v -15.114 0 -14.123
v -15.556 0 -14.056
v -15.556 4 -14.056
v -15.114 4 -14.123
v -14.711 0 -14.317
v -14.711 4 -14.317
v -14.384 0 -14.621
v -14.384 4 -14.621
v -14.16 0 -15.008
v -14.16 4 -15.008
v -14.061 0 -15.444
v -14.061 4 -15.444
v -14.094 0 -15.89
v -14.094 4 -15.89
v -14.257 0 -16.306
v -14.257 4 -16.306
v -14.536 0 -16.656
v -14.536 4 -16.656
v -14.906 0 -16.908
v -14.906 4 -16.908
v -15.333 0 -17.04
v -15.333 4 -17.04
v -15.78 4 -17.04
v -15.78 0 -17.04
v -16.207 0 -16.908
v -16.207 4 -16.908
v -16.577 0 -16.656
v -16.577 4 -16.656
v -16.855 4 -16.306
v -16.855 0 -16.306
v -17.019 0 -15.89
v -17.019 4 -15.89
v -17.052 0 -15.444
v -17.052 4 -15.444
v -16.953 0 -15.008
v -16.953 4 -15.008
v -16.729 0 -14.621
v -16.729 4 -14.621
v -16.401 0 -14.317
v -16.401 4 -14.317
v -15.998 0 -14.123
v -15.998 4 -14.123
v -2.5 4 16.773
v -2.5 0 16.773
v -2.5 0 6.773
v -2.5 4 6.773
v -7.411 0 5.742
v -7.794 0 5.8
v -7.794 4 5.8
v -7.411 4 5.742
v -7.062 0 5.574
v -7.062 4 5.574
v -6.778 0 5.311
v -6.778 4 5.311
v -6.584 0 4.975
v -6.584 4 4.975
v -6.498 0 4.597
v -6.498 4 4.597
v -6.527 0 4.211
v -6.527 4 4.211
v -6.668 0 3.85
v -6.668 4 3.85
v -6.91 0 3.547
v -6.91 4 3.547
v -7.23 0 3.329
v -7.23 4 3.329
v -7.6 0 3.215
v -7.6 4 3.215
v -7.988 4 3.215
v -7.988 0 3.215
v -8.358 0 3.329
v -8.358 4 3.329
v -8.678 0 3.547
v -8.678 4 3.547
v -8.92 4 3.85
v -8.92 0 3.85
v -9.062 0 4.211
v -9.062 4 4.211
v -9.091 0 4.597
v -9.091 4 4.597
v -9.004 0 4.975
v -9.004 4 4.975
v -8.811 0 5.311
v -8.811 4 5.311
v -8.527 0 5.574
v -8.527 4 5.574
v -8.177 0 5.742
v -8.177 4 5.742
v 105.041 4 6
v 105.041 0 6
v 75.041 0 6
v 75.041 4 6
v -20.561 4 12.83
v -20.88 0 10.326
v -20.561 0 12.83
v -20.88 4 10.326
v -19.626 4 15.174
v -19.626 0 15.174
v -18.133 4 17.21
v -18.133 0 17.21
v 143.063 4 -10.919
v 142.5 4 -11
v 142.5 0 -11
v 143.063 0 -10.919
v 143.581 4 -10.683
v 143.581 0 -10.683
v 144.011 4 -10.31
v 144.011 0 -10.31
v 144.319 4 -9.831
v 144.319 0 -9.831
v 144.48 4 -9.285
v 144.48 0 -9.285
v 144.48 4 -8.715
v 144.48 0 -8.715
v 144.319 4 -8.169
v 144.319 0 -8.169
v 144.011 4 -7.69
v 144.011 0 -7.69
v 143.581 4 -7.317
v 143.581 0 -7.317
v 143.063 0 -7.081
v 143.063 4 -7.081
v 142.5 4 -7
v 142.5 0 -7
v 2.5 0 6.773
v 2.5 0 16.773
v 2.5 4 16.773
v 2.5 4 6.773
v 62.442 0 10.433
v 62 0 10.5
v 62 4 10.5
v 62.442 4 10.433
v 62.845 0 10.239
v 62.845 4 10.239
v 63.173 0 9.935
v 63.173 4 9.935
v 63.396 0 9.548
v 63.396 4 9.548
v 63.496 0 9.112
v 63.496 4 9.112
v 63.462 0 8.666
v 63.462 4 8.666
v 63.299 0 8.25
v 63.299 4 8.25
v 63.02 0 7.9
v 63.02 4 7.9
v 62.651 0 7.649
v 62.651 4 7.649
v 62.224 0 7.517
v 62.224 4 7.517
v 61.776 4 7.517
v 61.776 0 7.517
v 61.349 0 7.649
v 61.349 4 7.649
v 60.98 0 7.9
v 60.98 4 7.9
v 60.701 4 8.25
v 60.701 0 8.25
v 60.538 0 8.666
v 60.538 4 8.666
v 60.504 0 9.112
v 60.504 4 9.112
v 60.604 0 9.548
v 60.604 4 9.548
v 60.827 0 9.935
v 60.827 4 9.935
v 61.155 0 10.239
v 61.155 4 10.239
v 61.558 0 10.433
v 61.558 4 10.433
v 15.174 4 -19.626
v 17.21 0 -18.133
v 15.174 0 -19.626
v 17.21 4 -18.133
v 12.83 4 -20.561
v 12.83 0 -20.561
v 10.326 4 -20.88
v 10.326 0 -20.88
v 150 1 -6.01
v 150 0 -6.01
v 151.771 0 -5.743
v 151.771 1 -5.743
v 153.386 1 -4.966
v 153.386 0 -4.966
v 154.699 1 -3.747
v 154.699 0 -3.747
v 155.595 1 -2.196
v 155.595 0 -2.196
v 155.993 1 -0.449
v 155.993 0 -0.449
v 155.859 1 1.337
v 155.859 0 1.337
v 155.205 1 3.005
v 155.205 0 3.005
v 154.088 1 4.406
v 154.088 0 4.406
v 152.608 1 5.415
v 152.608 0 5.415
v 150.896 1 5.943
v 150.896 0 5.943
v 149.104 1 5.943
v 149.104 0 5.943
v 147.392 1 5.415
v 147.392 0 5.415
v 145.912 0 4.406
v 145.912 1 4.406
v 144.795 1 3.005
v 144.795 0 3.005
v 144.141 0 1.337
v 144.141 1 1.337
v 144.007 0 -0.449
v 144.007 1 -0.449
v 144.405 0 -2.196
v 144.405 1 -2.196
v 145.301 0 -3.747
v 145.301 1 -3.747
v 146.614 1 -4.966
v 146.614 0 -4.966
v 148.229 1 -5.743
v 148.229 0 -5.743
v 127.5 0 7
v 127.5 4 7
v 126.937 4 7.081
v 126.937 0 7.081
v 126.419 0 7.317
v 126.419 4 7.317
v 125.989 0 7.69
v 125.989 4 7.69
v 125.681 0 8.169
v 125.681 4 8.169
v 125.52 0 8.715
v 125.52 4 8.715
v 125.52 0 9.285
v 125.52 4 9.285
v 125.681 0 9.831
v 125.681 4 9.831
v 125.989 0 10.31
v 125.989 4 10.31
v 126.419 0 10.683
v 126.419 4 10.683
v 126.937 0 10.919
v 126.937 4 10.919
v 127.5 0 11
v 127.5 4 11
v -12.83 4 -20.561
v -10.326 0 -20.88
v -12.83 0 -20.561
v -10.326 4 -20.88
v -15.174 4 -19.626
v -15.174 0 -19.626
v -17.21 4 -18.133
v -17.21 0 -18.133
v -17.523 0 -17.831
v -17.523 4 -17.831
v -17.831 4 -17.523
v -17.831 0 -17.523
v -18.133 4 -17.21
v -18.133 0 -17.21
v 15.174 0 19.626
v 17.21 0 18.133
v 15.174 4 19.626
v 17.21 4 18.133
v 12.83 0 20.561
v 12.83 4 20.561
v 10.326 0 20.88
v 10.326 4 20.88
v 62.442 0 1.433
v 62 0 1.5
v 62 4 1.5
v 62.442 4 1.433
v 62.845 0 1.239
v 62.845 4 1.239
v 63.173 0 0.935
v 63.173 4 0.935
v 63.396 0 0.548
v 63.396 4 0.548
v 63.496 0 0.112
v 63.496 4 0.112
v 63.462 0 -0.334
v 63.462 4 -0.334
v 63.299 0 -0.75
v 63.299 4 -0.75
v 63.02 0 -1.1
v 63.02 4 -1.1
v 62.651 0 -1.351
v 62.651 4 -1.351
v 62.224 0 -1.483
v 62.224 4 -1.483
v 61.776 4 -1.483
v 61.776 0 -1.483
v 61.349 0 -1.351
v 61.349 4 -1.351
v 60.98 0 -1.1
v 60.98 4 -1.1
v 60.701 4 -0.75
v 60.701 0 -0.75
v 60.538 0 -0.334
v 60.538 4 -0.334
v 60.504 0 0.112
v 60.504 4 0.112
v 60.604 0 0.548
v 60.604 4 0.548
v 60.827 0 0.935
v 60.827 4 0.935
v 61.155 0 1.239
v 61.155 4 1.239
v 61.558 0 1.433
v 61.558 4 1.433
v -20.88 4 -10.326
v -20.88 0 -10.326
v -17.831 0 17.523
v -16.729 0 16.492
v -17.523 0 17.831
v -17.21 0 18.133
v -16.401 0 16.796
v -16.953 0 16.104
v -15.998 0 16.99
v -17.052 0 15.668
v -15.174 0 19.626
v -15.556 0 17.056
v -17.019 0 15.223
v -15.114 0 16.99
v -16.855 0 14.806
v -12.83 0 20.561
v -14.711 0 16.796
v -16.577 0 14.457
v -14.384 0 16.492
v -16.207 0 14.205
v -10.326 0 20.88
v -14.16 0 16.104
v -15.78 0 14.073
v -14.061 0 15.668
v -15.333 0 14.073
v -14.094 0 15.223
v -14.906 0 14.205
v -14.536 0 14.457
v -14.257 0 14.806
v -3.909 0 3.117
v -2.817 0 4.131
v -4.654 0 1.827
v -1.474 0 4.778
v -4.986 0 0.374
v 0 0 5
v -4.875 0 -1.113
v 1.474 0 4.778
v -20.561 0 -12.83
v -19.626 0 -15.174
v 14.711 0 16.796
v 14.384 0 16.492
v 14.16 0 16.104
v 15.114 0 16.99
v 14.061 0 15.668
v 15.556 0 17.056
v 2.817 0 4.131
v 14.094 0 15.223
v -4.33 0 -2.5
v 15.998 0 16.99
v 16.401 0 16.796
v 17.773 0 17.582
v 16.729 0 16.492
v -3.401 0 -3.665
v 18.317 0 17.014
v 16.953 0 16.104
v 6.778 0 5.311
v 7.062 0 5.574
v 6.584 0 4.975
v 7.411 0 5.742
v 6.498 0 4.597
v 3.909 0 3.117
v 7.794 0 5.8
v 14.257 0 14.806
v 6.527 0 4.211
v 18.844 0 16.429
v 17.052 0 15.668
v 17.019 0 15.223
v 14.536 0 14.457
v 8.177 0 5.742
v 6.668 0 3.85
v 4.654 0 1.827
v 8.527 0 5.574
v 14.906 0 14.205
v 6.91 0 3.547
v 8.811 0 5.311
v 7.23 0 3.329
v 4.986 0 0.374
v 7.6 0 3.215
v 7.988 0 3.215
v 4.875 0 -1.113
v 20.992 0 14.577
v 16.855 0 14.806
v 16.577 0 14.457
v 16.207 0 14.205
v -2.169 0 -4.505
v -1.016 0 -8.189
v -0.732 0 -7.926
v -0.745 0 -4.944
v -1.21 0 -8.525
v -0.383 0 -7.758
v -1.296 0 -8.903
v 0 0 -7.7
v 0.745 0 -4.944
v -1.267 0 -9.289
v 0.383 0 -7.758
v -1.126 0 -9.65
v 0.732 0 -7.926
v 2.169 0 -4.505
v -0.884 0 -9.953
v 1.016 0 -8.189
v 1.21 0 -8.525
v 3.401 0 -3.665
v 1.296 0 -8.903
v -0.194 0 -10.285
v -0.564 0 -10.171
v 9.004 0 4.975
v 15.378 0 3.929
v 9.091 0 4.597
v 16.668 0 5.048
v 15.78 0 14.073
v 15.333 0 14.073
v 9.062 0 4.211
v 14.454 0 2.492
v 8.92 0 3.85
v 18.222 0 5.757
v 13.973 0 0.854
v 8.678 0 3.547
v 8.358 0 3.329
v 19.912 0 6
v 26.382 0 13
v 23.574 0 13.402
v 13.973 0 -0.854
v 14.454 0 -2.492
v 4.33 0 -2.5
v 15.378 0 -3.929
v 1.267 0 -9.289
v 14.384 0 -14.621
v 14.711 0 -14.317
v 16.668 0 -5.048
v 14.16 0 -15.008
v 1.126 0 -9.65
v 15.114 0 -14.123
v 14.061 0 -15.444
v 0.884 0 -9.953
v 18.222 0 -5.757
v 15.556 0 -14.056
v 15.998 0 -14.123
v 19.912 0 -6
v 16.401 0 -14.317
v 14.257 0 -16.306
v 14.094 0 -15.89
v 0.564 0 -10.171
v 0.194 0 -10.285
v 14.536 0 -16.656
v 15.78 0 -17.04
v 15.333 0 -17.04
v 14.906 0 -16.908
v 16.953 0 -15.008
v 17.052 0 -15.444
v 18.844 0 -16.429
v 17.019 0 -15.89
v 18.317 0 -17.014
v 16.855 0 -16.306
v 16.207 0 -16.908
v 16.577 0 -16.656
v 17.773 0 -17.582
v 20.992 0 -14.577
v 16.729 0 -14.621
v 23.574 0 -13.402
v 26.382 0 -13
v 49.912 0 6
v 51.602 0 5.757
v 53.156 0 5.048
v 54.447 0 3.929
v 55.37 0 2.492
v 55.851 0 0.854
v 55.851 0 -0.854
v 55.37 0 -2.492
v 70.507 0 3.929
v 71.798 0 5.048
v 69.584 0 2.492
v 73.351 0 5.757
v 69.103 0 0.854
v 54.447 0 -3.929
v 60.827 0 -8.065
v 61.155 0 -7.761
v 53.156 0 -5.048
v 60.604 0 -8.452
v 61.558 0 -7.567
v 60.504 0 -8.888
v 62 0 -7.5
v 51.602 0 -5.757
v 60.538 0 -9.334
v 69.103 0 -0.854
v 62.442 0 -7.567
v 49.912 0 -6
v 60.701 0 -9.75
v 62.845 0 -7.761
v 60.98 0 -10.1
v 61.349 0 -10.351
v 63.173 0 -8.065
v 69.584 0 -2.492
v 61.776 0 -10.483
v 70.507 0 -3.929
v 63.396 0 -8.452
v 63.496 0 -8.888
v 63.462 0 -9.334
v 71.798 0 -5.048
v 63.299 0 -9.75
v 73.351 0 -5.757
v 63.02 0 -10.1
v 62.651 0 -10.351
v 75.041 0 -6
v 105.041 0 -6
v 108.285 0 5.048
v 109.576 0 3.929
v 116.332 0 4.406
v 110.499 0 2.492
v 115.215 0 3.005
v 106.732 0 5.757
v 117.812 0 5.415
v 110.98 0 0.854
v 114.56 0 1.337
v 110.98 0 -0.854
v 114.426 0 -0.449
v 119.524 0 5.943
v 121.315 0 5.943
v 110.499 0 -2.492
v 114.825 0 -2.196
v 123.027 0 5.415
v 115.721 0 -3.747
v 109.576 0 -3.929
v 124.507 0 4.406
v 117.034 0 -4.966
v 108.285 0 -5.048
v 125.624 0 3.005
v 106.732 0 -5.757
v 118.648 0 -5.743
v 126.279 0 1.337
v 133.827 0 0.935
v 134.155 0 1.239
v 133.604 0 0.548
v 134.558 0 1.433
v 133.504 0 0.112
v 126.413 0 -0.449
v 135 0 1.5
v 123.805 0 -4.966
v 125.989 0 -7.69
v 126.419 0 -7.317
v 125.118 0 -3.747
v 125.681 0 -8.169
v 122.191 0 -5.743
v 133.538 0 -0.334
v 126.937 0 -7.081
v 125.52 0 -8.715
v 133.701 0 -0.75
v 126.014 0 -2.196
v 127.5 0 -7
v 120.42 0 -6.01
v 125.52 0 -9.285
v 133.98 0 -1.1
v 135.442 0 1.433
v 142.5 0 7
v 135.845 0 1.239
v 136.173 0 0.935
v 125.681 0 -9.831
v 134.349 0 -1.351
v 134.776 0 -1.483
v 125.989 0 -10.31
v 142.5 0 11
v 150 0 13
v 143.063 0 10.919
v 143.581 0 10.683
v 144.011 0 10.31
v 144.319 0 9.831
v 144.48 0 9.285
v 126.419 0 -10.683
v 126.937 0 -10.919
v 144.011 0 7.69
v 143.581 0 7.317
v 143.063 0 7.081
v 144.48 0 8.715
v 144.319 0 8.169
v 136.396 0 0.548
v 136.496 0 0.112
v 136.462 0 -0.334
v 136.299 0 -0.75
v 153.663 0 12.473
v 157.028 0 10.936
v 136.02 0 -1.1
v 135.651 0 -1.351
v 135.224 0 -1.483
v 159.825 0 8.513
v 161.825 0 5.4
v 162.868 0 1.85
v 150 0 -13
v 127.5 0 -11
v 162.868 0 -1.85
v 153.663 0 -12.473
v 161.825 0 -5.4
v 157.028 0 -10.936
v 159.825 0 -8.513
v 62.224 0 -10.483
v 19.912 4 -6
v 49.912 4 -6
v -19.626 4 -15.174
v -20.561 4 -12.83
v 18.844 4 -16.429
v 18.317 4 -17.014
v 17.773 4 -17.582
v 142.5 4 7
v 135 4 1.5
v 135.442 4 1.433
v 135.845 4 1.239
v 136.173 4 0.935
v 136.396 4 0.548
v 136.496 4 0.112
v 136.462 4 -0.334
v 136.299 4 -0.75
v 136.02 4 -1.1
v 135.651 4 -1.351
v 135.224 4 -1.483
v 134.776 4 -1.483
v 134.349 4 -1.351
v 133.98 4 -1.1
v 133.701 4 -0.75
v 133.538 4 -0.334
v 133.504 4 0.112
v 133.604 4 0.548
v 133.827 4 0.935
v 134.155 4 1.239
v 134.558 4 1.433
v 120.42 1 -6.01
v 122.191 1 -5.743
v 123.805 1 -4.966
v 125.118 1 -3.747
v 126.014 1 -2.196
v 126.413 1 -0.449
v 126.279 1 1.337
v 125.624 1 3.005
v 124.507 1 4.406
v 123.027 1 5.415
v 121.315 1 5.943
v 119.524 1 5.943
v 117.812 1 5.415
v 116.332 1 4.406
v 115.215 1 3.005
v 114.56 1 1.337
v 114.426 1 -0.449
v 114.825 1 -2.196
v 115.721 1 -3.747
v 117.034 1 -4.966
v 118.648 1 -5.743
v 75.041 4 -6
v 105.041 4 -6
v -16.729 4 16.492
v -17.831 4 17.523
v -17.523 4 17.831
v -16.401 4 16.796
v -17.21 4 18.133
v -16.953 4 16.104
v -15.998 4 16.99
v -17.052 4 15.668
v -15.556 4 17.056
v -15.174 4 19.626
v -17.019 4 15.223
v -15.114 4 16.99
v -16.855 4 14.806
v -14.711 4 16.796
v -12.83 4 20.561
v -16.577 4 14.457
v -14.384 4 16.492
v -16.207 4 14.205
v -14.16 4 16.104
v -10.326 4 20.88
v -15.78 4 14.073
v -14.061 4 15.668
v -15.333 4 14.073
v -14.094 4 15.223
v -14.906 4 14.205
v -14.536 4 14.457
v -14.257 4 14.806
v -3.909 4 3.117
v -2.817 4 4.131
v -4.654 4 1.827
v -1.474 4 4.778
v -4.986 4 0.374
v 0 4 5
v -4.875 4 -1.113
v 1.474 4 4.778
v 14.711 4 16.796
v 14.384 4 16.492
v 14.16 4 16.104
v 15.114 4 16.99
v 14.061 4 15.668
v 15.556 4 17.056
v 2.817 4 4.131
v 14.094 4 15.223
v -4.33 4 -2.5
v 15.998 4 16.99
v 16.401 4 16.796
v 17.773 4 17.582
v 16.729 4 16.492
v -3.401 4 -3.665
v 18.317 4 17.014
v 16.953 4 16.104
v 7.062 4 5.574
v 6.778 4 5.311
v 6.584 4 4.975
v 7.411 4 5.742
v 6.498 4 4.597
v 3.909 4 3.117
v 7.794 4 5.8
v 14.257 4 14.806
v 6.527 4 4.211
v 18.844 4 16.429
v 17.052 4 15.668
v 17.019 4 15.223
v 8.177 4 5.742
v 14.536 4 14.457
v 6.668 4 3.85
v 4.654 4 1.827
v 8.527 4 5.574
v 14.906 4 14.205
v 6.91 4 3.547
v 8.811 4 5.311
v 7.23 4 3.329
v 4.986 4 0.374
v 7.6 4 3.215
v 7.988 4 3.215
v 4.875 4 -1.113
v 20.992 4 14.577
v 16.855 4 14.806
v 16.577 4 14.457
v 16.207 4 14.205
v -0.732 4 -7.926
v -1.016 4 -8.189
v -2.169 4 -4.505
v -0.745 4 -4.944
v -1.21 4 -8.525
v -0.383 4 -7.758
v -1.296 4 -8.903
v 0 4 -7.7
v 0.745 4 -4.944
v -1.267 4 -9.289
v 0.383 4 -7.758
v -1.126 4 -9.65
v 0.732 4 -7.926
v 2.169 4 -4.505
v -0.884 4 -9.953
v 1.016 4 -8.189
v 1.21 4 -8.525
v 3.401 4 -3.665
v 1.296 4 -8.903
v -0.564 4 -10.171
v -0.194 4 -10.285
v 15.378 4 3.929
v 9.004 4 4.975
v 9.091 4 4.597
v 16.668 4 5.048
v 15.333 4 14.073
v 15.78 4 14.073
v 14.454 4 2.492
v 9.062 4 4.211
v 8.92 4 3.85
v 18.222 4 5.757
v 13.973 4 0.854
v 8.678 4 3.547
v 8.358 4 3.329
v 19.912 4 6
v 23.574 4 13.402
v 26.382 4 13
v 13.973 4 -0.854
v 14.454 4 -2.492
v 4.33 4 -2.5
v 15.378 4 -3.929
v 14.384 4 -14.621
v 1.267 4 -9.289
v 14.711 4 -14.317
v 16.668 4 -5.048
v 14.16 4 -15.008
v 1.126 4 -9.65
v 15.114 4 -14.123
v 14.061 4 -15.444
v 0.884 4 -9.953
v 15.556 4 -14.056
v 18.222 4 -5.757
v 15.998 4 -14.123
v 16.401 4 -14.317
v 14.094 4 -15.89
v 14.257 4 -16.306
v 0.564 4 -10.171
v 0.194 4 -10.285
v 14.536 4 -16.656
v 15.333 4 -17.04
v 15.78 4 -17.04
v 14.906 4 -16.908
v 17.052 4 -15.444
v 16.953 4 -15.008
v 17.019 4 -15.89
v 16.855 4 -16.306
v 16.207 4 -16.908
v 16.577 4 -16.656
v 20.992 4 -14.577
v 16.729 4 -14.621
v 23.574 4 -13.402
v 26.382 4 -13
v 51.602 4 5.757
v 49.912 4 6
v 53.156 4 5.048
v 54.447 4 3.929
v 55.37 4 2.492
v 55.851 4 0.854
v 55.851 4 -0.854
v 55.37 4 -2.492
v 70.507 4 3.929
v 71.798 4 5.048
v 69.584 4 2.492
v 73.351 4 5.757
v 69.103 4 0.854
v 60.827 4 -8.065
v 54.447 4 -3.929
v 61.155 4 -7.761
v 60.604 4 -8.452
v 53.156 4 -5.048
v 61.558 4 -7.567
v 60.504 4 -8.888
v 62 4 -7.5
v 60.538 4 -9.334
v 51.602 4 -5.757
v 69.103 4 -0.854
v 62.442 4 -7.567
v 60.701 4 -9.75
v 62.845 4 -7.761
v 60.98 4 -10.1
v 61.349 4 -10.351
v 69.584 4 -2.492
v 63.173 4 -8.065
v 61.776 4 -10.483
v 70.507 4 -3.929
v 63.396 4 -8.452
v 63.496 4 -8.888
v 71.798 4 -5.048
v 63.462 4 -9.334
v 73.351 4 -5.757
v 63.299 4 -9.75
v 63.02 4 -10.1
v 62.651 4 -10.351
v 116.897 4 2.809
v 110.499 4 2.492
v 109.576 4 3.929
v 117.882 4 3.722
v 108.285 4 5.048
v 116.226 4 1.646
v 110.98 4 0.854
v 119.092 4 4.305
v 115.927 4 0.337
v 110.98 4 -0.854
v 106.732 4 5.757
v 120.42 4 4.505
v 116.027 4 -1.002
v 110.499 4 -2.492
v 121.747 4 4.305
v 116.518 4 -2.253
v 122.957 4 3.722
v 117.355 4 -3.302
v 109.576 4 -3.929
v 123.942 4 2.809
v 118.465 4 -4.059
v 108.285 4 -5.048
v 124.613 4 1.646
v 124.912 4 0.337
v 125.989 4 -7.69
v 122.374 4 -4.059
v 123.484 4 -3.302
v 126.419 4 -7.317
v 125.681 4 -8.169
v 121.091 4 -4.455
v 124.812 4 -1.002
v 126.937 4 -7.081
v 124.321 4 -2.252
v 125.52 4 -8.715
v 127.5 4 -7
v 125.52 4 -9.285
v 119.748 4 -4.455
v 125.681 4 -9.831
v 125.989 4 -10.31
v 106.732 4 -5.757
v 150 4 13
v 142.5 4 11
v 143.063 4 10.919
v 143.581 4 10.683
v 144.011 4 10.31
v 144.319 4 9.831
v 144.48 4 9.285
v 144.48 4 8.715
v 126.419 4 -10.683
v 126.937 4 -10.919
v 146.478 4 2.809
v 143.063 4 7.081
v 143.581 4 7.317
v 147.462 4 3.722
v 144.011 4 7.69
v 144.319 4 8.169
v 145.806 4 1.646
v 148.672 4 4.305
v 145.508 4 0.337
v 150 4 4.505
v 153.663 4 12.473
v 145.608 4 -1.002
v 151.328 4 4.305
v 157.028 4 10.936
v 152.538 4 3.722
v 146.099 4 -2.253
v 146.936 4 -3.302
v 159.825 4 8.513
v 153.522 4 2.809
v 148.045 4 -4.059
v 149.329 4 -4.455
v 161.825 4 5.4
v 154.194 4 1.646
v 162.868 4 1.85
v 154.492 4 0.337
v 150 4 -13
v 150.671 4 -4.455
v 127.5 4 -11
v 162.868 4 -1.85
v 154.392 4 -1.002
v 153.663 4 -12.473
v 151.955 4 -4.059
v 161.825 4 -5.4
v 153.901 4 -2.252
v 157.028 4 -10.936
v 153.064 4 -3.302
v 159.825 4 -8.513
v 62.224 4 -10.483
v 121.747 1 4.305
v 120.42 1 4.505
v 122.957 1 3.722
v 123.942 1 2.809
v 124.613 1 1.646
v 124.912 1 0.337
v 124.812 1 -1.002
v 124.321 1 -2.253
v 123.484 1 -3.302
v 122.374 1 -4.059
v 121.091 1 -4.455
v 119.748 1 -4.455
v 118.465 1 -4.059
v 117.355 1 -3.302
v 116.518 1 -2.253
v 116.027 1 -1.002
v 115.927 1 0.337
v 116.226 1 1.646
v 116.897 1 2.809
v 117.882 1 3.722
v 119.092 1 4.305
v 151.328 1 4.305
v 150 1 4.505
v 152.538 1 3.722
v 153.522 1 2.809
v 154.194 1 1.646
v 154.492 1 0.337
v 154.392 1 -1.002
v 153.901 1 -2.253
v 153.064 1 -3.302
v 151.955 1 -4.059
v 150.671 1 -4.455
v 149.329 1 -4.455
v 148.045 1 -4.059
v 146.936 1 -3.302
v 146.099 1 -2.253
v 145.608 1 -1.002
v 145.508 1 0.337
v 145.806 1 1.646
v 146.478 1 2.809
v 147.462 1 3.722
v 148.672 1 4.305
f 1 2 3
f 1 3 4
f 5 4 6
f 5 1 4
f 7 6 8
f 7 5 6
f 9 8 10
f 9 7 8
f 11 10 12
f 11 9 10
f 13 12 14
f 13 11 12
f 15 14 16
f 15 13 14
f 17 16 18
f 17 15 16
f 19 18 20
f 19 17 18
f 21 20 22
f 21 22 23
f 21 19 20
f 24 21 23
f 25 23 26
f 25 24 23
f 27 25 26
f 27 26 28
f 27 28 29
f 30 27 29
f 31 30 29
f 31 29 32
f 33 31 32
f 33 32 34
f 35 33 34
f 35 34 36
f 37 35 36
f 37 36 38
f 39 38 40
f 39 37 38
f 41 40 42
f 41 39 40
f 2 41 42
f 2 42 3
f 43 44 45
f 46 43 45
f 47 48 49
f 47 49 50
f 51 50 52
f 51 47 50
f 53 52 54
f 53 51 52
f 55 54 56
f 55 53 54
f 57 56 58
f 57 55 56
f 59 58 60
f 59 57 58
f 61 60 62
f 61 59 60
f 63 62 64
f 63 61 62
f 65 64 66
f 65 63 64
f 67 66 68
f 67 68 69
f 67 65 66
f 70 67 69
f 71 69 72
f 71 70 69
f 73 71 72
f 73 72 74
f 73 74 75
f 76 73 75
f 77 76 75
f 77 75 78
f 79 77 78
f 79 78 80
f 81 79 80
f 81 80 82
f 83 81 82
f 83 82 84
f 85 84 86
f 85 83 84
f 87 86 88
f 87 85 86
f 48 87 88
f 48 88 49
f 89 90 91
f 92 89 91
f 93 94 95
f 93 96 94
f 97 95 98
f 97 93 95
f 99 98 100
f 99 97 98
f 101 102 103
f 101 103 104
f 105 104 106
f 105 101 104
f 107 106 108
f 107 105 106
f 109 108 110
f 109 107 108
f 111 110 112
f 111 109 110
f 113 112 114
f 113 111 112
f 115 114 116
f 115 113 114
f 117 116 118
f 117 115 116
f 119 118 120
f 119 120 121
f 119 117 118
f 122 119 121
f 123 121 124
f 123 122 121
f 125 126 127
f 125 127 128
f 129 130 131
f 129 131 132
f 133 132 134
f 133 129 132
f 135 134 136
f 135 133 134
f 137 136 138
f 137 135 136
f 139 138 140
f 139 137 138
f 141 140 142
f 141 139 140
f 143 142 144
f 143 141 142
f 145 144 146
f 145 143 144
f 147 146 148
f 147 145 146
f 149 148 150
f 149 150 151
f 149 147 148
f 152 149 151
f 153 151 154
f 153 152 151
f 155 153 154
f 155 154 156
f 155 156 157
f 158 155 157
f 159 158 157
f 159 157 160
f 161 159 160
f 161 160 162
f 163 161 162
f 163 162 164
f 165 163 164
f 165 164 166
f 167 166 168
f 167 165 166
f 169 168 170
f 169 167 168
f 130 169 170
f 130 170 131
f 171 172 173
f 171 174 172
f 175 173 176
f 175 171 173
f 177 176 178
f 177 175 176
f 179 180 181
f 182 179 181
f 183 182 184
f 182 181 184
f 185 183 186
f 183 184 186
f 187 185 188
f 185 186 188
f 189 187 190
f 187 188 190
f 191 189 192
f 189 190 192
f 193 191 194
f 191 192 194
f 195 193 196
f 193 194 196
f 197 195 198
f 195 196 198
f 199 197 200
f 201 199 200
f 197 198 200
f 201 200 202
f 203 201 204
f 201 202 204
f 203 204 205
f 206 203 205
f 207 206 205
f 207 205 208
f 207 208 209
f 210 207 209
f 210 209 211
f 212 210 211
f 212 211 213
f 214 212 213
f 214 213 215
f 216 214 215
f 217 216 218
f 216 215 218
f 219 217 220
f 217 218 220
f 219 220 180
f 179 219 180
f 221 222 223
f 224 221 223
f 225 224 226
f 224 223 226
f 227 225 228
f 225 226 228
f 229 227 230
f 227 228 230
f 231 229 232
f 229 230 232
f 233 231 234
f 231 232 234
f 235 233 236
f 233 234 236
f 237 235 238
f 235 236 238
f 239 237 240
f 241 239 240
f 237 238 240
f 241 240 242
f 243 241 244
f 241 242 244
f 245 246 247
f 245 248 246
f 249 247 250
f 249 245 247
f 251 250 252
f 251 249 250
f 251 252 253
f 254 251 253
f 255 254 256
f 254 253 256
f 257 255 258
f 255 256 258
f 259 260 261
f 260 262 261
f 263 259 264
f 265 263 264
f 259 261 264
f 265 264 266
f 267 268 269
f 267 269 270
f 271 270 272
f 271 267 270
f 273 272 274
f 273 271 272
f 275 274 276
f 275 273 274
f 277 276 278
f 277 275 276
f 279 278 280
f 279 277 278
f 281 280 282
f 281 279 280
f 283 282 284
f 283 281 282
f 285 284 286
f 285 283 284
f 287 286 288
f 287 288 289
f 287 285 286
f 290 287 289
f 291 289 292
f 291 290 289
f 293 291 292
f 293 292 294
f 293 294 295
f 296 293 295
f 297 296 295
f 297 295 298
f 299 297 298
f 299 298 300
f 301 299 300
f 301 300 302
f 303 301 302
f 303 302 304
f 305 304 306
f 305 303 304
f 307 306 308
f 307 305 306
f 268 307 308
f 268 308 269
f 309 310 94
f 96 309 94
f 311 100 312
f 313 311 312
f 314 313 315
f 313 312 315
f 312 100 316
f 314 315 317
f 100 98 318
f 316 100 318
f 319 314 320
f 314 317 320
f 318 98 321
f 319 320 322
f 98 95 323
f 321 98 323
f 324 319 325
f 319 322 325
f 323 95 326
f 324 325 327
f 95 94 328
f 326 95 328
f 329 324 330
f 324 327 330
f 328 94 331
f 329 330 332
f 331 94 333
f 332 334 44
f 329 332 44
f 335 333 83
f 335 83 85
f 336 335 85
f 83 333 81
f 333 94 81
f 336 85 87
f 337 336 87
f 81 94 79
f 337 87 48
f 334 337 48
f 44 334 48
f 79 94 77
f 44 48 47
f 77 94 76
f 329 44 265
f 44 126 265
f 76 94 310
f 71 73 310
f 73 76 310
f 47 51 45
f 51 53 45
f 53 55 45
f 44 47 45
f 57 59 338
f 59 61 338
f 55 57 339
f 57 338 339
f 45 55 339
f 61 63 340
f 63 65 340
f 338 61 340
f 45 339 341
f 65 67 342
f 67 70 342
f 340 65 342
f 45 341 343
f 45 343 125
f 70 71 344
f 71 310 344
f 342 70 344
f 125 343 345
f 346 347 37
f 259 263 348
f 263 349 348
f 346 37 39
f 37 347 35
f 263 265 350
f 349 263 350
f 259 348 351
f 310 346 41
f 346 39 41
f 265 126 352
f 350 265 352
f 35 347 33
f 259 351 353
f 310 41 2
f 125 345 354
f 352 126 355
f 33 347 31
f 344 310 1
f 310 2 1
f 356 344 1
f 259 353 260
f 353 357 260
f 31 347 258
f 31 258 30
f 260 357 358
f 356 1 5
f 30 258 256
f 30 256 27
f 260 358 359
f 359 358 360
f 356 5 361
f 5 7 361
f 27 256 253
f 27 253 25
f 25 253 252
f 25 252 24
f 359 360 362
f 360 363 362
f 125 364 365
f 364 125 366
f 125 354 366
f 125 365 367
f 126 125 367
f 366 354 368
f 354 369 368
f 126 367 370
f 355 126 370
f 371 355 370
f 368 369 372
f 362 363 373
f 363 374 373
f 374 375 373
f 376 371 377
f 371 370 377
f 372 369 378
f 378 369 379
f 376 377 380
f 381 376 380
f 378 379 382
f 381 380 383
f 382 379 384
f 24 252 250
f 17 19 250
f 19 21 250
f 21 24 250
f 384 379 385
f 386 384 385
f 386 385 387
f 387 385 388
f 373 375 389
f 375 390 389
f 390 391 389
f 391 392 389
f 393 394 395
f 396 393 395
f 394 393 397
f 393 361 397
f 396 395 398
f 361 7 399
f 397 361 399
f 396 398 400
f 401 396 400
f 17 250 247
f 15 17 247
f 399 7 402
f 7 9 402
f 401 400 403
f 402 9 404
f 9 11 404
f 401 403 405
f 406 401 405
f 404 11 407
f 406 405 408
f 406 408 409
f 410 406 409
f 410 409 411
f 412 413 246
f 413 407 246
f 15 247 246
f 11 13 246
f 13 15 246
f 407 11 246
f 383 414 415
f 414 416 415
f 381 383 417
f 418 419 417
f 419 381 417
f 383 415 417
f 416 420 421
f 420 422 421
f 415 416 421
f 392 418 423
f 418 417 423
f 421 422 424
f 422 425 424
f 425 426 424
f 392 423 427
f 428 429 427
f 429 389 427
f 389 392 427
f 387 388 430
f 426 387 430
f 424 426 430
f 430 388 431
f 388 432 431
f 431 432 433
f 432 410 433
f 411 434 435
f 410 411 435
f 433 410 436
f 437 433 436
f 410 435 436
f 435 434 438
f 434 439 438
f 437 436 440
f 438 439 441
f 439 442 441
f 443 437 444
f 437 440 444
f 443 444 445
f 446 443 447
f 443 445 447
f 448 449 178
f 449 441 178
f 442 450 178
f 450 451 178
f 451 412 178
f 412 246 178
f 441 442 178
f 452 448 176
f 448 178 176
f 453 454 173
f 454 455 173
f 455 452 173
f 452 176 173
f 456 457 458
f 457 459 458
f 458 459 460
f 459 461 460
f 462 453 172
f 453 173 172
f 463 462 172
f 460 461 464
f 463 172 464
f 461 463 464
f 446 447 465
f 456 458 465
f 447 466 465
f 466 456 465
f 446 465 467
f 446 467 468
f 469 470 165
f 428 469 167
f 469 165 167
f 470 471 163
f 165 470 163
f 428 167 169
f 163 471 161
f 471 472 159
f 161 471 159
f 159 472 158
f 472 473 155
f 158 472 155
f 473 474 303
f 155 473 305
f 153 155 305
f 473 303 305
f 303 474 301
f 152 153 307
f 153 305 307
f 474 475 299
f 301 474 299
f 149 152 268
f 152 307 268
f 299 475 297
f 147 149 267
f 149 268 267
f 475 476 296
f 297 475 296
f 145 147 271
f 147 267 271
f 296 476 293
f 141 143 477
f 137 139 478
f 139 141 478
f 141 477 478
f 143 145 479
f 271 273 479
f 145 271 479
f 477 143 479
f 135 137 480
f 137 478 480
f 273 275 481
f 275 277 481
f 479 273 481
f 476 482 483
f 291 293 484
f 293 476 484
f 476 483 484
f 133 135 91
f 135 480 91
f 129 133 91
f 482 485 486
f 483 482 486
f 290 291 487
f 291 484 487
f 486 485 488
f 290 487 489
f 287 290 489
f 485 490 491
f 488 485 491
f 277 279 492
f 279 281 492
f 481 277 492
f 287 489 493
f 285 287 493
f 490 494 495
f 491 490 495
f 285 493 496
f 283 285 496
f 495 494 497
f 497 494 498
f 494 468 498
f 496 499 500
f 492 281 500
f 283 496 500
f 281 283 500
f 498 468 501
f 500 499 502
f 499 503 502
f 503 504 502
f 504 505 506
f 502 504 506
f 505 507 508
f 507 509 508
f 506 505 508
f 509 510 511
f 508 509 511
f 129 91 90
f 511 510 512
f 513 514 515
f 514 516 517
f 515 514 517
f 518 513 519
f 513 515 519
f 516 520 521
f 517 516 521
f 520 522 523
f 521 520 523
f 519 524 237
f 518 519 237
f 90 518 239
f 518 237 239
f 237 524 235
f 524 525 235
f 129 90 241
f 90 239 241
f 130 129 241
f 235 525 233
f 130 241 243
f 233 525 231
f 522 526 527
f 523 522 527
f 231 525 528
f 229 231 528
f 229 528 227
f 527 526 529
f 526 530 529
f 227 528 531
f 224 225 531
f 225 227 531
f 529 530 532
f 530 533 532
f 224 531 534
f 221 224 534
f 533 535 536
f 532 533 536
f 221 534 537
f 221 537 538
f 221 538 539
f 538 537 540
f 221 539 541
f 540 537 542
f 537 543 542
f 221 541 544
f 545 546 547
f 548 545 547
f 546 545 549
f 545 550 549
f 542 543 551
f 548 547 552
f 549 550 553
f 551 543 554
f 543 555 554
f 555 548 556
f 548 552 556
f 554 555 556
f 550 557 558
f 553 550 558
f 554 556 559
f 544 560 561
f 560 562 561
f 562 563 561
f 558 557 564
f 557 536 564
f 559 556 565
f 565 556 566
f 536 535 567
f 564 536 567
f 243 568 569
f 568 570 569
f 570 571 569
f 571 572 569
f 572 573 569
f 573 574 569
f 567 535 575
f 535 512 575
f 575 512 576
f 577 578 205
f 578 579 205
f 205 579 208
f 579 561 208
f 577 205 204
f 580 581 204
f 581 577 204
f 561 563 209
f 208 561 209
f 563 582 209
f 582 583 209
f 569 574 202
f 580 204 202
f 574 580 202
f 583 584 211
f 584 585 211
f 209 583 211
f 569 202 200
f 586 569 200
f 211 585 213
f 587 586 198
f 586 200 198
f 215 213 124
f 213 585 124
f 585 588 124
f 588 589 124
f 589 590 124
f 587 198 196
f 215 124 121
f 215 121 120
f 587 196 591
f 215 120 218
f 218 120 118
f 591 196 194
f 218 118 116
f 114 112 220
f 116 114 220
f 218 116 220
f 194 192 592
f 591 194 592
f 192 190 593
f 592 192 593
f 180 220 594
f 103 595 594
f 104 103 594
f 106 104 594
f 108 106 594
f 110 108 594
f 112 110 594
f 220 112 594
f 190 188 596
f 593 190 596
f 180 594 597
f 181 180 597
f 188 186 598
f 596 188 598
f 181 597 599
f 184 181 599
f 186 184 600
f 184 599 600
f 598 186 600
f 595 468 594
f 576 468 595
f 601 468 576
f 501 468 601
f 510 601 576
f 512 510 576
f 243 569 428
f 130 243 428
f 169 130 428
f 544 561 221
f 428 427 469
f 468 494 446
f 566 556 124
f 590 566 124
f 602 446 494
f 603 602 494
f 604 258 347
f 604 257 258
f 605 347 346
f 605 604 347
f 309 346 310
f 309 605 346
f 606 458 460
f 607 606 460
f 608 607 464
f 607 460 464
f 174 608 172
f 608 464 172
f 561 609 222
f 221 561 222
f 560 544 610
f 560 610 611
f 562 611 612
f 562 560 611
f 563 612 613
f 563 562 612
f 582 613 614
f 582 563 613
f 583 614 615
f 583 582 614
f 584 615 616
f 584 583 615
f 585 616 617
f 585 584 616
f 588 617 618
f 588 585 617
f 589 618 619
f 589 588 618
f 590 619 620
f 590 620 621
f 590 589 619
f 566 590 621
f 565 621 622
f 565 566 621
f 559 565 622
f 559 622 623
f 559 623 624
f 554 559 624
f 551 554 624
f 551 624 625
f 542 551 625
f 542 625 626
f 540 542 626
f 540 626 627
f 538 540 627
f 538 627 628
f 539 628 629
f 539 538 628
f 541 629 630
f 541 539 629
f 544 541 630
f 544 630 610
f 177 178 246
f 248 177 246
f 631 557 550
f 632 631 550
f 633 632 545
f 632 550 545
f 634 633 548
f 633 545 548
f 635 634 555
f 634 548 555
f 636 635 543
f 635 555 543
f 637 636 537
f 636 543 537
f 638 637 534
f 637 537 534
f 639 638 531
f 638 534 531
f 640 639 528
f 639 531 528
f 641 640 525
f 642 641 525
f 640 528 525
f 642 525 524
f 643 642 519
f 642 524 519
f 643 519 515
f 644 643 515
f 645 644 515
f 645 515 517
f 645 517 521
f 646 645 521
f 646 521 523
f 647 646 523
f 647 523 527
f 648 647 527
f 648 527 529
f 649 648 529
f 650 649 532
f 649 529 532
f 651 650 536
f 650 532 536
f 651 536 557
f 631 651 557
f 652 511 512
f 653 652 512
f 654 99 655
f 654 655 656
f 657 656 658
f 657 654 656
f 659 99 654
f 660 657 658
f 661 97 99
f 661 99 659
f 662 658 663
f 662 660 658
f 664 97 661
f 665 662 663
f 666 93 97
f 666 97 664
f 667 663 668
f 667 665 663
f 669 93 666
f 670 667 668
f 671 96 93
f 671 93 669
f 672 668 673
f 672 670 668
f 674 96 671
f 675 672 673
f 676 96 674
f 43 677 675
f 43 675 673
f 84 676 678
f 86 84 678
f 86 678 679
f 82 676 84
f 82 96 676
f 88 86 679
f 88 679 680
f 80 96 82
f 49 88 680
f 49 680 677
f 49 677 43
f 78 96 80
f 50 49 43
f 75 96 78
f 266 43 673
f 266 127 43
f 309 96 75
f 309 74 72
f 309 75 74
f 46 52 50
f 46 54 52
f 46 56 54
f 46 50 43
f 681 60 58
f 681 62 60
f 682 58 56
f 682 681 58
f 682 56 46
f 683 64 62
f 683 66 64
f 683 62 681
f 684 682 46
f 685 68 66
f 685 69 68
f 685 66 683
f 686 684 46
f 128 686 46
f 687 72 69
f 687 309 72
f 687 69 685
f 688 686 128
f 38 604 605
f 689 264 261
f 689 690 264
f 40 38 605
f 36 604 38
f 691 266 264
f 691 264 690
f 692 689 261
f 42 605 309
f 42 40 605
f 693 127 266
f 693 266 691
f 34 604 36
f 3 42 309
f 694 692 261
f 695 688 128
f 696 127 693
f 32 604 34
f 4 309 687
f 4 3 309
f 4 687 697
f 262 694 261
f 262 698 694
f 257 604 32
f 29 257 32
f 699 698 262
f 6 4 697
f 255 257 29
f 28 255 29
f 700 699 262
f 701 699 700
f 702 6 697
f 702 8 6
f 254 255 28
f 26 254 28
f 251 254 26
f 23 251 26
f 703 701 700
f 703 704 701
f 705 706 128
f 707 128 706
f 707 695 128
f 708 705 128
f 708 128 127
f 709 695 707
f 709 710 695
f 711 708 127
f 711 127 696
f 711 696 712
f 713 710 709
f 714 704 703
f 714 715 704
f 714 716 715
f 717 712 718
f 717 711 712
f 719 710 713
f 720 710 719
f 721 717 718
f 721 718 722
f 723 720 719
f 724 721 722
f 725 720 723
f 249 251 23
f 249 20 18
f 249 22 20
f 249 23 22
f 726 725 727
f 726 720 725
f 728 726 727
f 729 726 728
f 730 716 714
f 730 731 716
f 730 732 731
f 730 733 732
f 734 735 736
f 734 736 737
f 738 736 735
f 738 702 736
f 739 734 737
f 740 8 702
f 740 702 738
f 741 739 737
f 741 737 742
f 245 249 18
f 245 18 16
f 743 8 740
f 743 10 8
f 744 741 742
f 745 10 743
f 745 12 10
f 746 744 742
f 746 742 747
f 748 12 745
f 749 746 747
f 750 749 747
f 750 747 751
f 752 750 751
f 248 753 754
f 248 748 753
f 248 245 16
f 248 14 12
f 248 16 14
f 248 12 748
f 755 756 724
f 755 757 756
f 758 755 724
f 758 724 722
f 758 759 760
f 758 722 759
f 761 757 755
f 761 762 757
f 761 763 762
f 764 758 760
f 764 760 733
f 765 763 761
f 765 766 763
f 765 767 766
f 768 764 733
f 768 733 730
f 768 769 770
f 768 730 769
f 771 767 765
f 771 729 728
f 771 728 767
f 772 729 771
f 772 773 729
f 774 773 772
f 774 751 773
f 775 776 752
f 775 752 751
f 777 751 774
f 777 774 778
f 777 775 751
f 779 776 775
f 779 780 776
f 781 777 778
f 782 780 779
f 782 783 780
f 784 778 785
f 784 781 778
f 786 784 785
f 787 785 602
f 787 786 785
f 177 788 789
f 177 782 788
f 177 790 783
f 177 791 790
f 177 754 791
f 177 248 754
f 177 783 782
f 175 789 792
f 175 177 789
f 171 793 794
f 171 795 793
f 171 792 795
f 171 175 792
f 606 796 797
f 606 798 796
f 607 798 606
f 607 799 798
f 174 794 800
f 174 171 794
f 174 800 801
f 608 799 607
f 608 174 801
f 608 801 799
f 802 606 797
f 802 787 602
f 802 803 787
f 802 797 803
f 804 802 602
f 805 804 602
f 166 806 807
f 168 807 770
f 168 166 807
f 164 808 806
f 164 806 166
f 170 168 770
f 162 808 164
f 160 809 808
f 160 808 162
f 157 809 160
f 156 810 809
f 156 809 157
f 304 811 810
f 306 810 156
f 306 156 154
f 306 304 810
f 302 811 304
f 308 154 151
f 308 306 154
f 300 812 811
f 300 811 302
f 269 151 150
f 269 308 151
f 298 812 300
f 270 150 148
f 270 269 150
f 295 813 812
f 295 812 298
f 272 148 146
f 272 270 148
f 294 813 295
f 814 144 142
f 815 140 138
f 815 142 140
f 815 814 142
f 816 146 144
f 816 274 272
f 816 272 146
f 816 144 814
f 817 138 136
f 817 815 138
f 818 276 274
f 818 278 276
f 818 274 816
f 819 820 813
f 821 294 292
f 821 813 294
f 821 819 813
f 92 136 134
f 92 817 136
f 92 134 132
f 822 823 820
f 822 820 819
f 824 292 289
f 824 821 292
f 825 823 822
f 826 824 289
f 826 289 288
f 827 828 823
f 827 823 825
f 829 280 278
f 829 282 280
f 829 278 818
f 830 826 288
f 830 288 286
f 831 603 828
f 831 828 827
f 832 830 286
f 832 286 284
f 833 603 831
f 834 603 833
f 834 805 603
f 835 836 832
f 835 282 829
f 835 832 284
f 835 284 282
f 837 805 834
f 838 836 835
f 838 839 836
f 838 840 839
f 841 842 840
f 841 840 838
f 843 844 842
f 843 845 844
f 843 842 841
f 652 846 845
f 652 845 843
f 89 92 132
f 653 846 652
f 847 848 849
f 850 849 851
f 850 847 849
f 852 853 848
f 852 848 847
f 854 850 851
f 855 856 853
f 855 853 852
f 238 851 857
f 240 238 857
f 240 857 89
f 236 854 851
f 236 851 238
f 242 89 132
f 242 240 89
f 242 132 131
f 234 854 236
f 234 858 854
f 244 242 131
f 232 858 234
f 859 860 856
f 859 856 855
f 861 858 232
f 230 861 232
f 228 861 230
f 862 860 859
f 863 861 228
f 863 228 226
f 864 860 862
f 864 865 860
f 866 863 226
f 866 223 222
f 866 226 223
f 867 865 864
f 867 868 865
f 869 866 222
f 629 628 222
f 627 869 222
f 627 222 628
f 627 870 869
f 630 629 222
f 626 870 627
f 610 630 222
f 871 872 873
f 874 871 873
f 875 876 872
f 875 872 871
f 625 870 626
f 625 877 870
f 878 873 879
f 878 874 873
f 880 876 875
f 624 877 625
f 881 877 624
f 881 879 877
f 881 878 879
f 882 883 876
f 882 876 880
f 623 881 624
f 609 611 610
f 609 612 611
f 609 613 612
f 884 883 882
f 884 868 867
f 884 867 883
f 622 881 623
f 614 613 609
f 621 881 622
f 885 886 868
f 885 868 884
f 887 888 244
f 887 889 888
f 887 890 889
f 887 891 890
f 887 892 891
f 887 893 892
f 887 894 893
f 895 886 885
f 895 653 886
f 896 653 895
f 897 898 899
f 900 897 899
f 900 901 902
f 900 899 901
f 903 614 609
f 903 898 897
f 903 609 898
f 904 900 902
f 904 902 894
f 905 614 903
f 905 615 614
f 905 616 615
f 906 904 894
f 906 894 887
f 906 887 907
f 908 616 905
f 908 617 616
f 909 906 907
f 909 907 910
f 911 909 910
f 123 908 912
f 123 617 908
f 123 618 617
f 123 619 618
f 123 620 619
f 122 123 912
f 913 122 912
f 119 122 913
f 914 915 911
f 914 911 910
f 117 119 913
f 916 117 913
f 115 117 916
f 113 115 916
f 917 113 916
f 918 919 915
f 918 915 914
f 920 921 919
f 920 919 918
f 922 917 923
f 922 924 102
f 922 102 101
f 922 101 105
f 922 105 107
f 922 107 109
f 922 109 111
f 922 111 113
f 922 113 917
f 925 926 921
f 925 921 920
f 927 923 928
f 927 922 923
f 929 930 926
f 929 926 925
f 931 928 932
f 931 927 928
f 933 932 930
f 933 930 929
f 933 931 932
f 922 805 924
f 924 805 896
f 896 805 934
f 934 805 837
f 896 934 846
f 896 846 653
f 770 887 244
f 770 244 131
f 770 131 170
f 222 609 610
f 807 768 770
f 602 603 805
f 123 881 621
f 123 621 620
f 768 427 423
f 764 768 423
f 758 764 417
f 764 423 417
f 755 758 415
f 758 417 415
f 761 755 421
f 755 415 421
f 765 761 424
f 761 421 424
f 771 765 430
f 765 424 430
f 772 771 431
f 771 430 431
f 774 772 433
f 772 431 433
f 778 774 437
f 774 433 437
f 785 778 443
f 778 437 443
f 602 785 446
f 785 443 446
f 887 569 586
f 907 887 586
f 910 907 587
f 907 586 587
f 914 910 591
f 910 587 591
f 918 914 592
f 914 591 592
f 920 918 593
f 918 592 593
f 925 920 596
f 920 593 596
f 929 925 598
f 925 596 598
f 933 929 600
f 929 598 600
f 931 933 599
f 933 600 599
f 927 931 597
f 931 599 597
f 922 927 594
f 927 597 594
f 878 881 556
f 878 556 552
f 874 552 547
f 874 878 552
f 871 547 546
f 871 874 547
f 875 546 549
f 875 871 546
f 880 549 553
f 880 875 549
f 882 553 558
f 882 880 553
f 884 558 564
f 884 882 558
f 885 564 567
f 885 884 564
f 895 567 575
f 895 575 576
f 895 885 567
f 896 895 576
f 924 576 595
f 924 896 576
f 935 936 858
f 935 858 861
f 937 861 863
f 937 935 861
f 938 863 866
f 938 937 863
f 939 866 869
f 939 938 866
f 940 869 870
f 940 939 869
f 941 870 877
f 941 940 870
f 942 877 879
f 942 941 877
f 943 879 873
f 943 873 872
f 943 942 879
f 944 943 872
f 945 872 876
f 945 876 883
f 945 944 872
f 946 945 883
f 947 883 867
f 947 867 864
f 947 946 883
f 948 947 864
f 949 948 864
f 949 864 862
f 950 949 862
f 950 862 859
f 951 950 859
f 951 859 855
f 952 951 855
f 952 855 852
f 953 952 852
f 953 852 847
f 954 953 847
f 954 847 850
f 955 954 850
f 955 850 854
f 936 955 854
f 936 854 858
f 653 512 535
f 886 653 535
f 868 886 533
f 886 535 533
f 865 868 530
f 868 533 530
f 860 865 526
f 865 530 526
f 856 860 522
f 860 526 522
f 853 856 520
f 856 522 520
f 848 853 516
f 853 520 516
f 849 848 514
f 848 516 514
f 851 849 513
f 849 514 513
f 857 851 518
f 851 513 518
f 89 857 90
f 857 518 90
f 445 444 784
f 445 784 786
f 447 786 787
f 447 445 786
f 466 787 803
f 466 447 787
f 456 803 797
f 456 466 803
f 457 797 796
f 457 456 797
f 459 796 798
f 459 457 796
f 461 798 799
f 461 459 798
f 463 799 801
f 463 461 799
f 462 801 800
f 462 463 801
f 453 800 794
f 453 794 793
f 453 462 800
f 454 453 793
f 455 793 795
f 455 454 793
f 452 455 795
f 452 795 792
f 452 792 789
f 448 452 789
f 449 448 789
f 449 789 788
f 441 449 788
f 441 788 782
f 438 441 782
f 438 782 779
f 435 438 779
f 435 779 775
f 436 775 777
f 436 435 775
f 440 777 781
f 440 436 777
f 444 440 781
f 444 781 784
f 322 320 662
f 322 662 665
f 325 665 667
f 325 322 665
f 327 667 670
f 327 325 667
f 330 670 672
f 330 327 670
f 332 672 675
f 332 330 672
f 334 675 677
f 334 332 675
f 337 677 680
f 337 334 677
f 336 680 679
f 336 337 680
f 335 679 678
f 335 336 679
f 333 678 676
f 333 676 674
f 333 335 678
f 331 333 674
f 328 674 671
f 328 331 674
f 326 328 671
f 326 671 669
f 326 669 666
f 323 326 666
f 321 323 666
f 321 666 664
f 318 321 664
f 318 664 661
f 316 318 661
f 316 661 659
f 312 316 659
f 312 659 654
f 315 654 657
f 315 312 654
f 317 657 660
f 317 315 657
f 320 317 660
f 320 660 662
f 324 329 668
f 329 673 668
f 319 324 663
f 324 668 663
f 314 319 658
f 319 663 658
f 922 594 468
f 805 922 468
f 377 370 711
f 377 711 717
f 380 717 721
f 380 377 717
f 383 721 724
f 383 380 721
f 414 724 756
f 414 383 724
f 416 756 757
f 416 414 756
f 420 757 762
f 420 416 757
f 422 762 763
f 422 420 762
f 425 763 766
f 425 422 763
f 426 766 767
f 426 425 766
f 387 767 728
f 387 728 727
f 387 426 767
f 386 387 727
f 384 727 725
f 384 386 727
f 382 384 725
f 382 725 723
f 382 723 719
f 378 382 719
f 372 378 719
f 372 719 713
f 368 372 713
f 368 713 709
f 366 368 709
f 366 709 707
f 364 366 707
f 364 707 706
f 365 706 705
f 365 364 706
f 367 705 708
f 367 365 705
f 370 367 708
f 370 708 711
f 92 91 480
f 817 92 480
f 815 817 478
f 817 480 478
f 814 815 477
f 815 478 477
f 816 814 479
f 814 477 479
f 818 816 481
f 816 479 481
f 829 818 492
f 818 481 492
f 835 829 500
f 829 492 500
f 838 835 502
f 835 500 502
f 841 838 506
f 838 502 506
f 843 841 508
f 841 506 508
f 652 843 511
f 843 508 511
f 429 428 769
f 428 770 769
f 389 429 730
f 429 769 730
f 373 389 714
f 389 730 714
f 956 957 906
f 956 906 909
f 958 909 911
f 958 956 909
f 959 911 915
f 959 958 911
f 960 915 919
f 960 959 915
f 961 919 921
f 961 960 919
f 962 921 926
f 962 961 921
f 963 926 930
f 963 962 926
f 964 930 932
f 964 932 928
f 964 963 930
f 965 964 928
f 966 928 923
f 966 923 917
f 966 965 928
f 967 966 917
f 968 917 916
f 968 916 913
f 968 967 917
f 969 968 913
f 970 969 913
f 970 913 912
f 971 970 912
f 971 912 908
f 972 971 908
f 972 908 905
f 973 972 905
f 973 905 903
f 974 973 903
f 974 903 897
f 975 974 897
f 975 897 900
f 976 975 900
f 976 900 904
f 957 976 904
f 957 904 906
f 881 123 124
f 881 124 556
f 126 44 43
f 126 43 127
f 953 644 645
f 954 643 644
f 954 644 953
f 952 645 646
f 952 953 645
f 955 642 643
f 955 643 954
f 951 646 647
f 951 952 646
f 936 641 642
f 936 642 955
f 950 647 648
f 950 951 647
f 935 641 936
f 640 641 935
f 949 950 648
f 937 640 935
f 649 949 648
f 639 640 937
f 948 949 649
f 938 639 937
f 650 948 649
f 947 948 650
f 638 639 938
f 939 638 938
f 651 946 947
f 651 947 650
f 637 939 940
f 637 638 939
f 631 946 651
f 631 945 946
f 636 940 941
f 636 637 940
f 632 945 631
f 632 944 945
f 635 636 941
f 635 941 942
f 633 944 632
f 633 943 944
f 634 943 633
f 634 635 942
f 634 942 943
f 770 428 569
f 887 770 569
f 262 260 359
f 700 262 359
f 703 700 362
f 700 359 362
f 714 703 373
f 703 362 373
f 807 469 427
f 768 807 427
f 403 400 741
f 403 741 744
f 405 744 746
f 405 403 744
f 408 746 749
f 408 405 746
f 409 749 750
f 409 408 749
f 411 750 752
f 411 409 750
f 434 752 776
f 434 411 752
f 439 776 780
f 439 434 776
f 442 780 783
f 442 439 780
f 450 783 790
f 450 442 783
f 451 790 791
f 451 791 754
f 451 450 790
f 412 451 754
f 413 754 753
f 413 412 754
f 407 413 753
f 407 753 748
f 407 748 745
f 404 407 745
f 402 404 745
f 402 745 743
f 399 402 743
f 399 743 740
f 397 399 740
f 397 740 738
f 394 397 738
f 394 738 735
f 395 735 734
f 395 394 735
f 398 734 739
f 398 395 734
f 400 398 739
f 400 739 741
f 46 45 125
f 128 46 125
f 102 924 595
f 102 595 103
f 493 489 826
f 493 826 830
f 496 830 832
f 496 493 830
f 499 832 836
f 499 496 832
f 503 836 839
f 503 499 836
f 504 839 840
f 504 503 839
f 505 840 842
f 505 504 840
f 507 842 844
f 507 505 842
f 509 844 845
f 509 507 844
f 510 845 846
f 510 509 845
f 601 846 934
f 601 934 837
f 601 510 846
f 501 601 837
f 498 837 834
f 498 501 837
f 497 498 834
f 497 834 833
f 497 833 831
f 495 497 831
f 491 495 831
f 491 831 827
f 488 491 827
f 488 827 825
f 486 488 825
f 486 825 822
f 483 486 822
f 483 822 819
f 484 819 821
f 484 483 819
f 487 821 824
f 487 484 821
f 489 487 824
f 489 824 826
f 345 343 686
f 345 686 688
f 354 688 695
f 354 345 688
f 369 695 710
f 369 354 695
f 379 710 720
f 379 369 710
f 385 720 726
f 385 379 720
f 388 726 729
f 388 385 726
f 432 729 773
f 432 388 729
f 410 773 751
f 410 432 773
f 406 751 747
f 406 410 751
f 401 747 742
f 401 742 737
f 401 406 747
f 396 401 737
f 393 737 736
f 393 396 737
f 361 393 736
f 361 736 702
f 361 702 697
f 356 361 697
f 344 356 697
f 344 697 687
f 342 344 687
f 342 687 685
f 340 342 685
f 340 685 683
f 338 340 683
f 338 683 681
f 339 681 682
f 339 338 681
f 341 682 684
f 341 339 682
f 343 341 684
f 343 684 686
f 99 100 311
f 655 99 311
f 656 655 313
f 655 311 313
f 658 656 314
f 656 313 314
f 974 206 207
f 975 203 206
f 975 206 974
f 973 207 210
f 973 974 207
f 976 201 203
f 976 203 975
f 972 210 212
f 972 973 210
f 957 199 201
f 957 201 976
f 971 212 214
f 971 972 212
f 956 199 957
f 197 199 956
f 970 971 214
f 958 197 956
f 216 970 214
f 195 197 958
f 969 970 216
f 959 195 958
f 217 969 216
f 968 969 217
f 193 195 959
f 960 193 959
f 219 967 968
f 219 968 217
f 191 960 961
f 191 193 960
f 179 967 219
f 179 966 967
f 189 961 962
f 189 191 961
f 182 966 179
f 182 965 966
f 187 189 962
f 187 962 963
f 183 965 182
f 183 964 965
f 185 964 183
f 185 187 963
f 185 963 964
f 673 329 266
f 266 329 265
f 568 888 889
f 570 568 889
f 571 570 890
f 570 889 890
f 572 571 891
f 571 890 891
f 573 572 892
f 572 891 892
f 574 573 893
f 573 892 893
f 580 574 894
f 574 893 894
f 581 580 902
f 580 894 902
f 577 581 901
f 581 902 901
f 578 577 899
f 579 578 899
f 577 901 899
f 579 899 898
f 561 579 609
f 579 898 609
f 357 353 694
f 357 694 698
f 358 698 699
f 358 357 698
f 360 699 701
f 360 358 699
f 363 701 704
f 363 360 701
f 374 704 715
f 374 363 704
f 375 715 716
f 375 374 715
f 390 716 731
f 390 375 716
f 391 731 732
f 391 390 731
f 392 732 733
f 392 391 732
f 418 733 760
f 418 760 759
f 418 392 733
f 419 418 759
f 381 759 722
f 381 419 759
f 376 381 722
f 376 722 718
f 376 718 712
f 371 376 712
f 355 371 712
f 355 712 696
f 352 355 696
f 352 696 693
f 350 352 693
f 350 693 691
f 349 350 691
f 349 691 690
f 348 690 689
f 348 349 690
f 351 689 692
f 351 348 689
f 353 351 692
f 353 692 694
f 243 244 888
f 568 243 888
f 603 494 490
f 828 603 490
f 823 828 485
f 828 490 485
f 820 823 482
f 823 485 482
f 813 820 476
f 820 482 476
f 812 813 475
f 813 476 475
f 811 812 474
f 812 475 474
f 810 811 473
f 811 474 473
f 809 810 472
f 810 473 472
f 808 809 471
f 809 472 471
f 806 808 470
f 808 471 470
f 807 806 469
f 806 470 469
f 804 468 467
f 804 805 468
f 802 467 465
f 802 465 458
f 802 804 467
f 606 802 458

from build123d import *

# Parameters (mm, degrees)
SKETCH_1_R          = 5
SKETCH_1_R_2        = 4.505
SKETCH_1_R_3        = 1.3
SKETCH_1_R_4        = 1.5
SKETCH_1_W          = 5
SKETCH_1_H          = 10
EXTRUDE_1_DEPTH     = 4
SKETCH_2_R          = 6.01
CUT_EXTRUDE_1_DEPTH = 1
CUT_EXTRUDE_4_DEPTH = 4
FILLET_1_R          = 10


with BuildPart() as part:
    # 草图1 → 凸台-拉伸1 (new body)
    with BuildSketch(Plane(origin=(0, 0, 0), x_dir=(1, 0, 0), z_dir=(0, 1, 0))):
        with BuildLine():
            Line((150, 13), (21.354156504, 13))
            ThreePointArc((21.354156504, 13), (17.988228463, 17.361556288), (13.748715927, 20.879961934))
            Line((13.748715927, 20.879961934), (-13.748715927, 20.879961934))
            ThreePointArc((-13.748715927, 20.879961934), (-17.67766953, 17.67766953), (-20.879961934, 13.748715927))
            Line((-20.879961934, 13.748715927), (-20.879961934, -13.748715927))
            ThreePointArc((-20.879961934, -13.748715927), (-17.67766953, -17.67766953), (-13.748715927, -20.879961934))
            Line((-13.748715927, -20.879961934), (13.748715927, -20.879961934))
            ThreePointArc((13.748715927, -20.879961934), (17.988228463, -17.361556288), (21.354156504, -13))
            Line((21.354156504, -13), (150, -13))
            ThreePointArc((150, -13), (163, 0), (150, 13))
        make_face()
        with Locations(Location((0, 0, 0), (0, 0, 270))):
            Circle(SKETCH_1_R, mode=Mode.SUBTRACT)
        with Locations(Location((150, 0, 0), (0, 0, 270))):
            Circle(SKETCH_1_R_2, mode=Mode.SUBTRACT)
        with Locations(Location((120.4195, 0, 0), (0, 0, 270))):
            Circle(SKETCH_1_R_2, mode=Mode.SUBTRACT)
        with Locations(Location((0, 9, 0), (0, 0, 270))):
            Circle(SKETCH_1_R_3, mode=Mode.SUBTRACT)
        with Locations(Location((7.794228634, -4.5, 0), (0, 0, 270))):
            Circle(SKETCH_1_R_3, mode=Mode.SUBTRACT)
        with Locations(Location((-7.794228634, -4.5, 0), (0, 0, 270))):
            Circle(SKETCH_1_R_3, mode=Mode.SUBTRACT)
        with Locations(Location((135, 0, 0), (0, 0, 270))):
            Circle(SKETCH_1_R_4, mode=Mode.SUBTRACT)
        with Locations(Location((62, 0, 0), (0, 0, 270))):
            Circle(SKETCH_1_R_4, mode=Mode.SUBTRACT)
        with Locations(Location((62, 9, 0), (0, 0, 270))):
            Circle(SKETCH_1_R_4, mode=Mode.SUBTRACT)
        with Locations(Location((62, -9, 0), (0, 0, 270))):
            Circle(SKETCH_1_R_4, mode=Mode.SUBTRACT)
        with Locations(Location((-15.556349186, 15.556349186, 0), (0, 0, 270))):
            Circle(SKETCH_1_R_4, mode=Mode.SUBTRACT)
        with Locations(Location((15.556349186, 15.556349186, 0), (0, 0, 270))):
            Circle(SKETCH_1_R_4, mode=Mode.SUBTRACT)
        with Locations(Location((15.556349186, -15.556349186, 0), (0, 0, 270))):
            Circle(SKETCH_1_R_4, mode=Mode.SUBTRACT)
        with Locations(Location((-15.556349186, -15.556349186, 0), (0, 0, 270))):
            Circle(SKETCH_1_R_4, mode=Mode.SUBTRACT)
        with Locations((0, -11.773380776)):
            Rectangle(SKETCH_1_W, SKETCH_1_H, mode=Mode.SUBTRACT)
        with BuildLine():
            Line((49.912097798, -6), (19.912097798, -6))
            ThreePointArc((19.912097798, -6), (13.912097798, 0), (19.912097798, 6))
            Line((19.912097798, 6), (49.912097798, 6))
            ThreePointArc((49.912097798, 6), (55.912097798, 0), (49.912097798, -6))
        make_face(mode=Mode.SUBTRACT)
        with BuildLine():
            Line((105.041482469, -6), (75.041482469, -6))
            ThreePointArc((75.041482469, -6), (69.041482469, 0), (75.041482469, 6))
            Line((75.041482469, 6), (105.041482469, 6))
            ThreePointArc((105.041482469, 6), (111.041482469, 0), (105.041482469, -6))
        make_face(mode=Mode.SUBTRACT)
    extrude(amount=EXTRUDE_1_DEPTH)

    # 草图2 → 切除-拉伸1 (cut)
    with BuildSketch(Plane.XZ):
        with Locations(Location((150, 0, 0), (0, 0, 270))):
            Circle(SKETCH_2_R)
        with Locations(Location((120.4195, 0, 0), (0, 0, 270))):
            Circle(SKETCH_2_R)
    extrude(amount=-CUT_EXTRUDE_1_DEPTH, mode=Mode.SUBTRACT)

    # 草图4 → 切除-拉伸4 (cut)
    with BuildSketch(Plane(origin=(0, 4, 0), x_dir=(1, 0, 0), z_dir=(0, 1, 0))):
        with BuildLine():
            Line((127.5, 11), (142.5, 11))
            ThreePointArc((142.5, 11), (144.5, 9), (142.5, 7))
            Line((142.5, 7), (127.5, 7))
            ThreePointArc((127.5, 7), (125.5, 9), (127.5, 11))
        make_face()
        with BuildLine():
            Line((127.5, -11), (142.5, -11))
            ThreePointArc((142.5, -11), (144.5, -9), (142.5, -7))
            Line((142.5, -7), (127.5, -7))
            ThreePointArc((127.5, -7), (125.5, -9), (127.5, -11))
        make_face()
    extrude(amount=-CUT_EXTRUDE_4_DEPTH, mode=Mode.SUBTRACT)

    # 圆角1
    fillet_1_edges = [part.edges().sort_by_distance(p)[0] for p in [
        (21.354156504, 2, 13),
        (13.748715927, 2, 20.879961934),
        (-13.748715927, 2, 20.879961934),
        (-20.879961934, 2, 13.748715927),
        (-20.879961934, 2, -13.748715927),
        (-13.748715927, 2, -20.879961934),
        (13.748715927, 2, -20.879961934),
        (21.354156504, 2, -13),
    ]]
    fillet(fillet_1_edges, radius=FILLET_1_R)


solid = part.part
